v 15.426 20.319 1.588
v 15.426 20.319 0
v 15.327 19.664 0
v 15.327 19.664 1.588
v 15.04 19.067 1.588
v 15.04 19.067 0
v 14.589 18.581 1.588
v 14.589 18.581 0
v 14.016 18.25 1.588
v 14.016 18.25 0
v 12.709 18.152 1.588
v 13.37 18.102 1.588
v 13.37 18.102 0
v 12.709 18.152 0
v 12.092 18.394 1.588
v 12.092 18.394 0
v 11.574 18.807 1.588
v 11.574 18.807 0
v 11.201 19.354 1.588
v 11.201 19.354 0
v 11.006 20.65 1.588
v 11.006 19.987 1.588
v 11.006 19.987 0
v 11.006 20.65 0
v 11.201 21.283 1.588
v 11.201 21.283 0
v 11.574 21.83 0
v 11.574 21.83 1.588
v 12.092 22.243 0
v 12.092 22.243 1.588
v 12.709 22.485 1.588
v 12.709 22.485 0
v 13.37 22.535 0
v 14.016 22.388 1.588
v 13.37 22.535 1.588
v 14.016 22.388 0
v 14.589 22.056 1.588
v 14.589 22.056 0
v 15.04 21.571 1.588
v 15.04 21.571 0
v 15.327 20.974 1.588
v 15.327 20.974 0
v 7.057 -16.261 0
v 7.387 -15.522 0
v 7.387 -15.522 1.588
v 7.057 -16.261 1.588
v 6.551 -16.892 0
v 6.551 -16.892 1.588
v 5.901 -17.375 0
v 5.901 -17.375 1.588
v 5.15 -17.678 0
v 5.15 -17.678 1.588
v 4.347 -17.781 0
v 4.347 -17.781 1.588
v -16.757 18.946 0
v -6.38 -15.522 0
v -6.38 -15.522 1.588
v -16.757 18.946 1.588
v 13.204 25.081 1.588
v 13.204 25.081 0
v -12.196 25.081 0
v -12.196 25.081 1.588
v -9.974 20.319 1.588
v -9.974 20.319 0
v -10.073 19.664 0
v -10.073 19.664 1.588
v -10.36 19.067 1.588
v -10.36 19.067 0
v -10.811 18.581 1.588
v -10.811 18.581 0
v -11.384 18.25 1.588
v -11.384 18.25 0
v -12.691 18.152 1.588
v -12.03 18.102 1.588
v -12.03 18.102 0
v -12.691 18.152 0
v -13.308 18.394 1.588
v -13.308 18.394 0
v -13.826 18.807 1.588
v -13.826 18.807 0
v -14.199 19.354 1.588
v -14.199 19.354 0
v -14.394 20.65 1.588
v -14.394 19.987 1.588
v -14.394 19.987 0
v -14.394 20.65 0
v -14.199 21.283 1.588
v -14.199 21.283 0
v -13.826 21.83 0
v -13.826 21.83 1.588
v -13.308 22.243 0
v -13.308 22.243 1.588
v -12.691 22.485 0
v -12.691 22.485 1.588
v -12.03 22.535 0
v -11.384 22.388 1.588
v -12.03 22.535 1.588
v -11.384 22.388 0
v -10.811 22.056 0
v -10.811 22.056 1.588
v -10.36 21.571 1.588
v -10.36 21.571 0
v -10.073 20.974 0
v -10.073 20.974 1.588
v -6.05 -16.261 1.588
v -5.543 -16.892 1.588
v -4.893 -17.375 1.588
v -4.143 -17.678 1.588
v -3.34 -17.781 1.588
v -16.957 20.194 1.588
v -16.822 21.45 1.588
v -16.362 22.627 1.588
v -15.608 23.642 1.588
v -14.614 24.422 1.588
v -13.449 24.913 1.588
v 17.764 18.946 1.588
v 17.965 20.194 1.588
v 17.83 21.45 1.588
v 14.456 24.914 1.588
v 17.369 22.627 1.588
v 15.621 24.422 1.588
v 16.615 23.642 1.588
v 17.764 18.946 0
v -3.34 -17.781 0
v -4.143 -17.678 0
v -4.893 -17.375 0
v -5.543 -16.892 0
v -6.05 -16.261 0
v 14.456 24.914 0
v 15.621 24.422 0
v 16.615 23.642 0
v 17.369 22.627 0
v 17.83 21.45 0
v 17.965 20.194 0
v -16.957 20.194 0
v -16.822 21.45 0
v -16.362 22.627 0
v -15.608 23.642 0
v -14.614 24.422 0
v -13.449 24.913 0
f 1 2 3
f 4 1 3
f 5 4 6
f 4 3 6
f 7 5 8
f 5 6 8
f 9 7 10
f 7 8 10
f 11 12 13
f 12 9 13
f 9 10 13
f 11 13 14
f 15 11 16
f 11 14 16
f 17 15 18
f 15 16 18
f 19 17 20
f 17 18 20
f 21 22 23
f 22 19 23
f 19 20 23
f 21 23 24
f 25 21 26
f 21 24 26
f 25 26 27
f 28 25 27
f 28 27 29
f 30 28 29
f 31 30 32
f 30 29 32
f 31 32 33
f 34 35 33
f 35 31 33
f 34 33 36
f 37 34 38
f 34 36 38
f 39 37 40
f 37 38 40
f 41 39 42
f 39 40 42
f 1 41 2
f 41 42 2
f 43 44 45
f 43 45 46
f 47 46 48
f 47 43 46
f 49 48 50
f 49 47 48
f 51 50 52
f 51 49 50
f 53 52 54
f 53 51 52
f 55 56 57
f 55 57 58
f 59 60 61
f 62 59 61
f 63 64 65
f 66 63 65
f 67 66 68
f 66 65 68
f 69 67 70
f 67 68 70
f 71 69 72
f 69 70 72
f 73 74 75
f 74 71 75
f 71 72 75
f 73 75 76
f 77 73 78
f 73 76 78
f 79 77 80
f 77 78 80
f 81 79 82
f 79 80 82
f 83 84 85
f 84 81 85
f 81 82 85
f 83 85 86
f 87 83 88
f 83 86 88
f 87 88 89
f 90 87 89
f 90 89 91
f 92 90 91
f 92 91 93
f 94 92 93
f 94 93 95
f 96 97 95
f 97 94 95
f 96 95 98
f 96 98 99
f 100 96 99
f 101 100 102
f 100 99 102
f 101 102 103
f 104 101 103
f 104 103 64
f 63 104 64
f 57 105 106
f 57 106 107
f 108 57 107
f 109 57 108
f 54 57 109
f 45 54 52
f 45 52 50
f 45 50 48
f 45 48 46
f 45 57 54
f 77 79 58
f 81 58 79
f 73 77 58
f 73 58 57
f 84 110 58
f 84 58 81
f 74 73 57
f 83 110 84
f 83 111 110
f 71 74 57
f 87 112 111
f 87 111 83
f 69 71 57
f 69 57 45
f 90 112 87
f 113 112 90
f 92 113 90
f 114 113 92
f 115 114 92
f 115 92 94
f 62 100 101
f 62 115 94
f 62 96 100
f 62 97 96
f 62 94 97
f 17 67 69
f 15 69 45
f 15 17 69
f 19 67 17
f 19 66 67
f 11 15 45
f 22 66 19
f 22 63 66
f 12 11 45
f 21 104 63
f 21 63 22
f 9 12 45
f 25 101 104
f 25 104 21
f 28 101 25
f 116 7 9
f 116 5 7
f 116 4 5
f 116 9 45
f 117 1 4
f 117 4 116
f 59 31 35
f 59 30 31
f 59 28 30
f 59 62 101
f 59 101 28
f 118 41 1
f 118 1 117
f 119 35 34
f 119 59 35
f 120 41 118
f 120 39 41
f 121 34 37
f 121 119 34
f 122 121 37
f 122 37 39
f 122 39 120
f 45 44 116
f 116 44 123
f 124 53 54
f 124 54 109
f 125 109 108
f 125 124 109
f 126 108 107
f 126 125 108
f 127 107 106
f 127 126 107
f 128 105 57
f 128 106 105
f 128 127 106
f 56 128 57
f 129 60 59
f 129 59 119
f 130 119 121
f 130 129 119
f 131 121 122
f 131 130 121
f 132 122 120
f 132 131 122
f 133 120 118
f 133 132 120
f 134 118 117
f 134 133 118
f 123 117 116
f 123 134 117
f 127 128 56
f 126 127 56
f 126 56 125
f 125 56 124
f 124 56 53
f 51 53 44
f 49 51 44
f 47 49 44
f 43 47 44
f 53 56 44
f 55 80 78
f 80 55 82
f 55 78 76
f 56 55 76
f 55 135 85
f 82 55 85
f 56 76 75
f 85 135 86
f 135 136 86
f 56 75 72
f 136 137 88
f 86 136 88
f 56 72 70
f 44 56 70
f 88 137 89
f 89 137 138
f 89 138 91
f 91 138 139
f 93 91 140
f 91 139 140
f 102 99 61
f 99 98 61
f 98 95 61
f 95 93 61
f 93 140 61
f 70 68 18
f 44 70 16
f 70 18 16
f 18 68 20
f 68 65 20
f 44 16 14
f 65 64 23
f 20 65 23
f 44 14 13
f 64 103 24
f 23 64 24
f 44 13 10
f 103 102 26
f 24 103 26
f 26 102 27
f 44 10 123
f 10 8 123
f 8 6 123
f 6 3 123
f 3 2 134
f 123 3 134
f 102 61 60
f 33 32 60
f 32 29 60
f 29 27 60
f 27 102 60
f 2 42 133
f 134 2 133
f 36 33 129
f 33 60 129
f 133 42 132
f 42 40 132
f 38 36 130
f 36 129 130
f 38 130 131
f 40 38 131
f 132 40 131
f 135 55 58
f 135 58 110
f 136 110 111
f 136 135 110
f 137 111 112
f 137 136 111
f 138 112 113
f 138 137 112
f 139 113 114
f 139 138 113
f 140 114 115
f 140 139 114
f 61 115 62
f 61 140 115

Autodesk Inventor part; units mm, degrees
ref_plane "YZ Plane" through (0, 0, 0) normal (1, 0, 0) x (0, 1, 0)
ref_plane "XZ Plane" through (0, 0, 0) normal (0, 1, 0) x (-1, 0, 0)
ref_plane "XY Plane" through (0, 0, 0) normal (0, 0, 1) x (1, 0, 0)
sketch "Sketch1" plane through (0, 0, 0) normal (0, 0, 1) x (1, 0, 0)
  circle A0 centre (13.2036, 20.3187) radius 2.2225
  circle A1 centre (-12.1964, 20.3187) radius 2.2225
  arc A2 (17.764, 18.9458) -> (13.2036, 25.0812) centre (13.2036, 20.3187) ccw
  arc A3 (-12.1964, 25.0812) -> (-16.7567, 18.9458) centre (-12.1964, 20.3187) ccw
  line L0 (13.2036, 25.0812) -> (-12.1964, 25.0812)
  line L1 (7.3873, -15.5216) -> (17.764, 18.9458)
  line L2 (4.3471, -17.7813) -> (-3.3398, -17.7813)
  line L3 (-6.38, -15.5216) -> (-16.7567, 18.9458)
  arc A4 (4.3471, -17.7813) -> (7.3873, -15.5216) centre (4.3471, -14.6063) ccw
  arc A5 (-6.38, -15.5216) -> (-3.3398, -17.7813) centre (-3.3398, -14.6063) ccw
  point P0 (0, 0)
  point P1 (6.707, -17.7813)
  dimension "d0" = 38.1
  dimension "d1" = 3.175
  dimension "d2" = 4.7625
  dimension "d3" = 4.7625
extrude "Extrusion1" add sketch "Sketch1" along normal blind 1.5875
properties part number "hoook_gusset" material "Acetal Resin, White"
